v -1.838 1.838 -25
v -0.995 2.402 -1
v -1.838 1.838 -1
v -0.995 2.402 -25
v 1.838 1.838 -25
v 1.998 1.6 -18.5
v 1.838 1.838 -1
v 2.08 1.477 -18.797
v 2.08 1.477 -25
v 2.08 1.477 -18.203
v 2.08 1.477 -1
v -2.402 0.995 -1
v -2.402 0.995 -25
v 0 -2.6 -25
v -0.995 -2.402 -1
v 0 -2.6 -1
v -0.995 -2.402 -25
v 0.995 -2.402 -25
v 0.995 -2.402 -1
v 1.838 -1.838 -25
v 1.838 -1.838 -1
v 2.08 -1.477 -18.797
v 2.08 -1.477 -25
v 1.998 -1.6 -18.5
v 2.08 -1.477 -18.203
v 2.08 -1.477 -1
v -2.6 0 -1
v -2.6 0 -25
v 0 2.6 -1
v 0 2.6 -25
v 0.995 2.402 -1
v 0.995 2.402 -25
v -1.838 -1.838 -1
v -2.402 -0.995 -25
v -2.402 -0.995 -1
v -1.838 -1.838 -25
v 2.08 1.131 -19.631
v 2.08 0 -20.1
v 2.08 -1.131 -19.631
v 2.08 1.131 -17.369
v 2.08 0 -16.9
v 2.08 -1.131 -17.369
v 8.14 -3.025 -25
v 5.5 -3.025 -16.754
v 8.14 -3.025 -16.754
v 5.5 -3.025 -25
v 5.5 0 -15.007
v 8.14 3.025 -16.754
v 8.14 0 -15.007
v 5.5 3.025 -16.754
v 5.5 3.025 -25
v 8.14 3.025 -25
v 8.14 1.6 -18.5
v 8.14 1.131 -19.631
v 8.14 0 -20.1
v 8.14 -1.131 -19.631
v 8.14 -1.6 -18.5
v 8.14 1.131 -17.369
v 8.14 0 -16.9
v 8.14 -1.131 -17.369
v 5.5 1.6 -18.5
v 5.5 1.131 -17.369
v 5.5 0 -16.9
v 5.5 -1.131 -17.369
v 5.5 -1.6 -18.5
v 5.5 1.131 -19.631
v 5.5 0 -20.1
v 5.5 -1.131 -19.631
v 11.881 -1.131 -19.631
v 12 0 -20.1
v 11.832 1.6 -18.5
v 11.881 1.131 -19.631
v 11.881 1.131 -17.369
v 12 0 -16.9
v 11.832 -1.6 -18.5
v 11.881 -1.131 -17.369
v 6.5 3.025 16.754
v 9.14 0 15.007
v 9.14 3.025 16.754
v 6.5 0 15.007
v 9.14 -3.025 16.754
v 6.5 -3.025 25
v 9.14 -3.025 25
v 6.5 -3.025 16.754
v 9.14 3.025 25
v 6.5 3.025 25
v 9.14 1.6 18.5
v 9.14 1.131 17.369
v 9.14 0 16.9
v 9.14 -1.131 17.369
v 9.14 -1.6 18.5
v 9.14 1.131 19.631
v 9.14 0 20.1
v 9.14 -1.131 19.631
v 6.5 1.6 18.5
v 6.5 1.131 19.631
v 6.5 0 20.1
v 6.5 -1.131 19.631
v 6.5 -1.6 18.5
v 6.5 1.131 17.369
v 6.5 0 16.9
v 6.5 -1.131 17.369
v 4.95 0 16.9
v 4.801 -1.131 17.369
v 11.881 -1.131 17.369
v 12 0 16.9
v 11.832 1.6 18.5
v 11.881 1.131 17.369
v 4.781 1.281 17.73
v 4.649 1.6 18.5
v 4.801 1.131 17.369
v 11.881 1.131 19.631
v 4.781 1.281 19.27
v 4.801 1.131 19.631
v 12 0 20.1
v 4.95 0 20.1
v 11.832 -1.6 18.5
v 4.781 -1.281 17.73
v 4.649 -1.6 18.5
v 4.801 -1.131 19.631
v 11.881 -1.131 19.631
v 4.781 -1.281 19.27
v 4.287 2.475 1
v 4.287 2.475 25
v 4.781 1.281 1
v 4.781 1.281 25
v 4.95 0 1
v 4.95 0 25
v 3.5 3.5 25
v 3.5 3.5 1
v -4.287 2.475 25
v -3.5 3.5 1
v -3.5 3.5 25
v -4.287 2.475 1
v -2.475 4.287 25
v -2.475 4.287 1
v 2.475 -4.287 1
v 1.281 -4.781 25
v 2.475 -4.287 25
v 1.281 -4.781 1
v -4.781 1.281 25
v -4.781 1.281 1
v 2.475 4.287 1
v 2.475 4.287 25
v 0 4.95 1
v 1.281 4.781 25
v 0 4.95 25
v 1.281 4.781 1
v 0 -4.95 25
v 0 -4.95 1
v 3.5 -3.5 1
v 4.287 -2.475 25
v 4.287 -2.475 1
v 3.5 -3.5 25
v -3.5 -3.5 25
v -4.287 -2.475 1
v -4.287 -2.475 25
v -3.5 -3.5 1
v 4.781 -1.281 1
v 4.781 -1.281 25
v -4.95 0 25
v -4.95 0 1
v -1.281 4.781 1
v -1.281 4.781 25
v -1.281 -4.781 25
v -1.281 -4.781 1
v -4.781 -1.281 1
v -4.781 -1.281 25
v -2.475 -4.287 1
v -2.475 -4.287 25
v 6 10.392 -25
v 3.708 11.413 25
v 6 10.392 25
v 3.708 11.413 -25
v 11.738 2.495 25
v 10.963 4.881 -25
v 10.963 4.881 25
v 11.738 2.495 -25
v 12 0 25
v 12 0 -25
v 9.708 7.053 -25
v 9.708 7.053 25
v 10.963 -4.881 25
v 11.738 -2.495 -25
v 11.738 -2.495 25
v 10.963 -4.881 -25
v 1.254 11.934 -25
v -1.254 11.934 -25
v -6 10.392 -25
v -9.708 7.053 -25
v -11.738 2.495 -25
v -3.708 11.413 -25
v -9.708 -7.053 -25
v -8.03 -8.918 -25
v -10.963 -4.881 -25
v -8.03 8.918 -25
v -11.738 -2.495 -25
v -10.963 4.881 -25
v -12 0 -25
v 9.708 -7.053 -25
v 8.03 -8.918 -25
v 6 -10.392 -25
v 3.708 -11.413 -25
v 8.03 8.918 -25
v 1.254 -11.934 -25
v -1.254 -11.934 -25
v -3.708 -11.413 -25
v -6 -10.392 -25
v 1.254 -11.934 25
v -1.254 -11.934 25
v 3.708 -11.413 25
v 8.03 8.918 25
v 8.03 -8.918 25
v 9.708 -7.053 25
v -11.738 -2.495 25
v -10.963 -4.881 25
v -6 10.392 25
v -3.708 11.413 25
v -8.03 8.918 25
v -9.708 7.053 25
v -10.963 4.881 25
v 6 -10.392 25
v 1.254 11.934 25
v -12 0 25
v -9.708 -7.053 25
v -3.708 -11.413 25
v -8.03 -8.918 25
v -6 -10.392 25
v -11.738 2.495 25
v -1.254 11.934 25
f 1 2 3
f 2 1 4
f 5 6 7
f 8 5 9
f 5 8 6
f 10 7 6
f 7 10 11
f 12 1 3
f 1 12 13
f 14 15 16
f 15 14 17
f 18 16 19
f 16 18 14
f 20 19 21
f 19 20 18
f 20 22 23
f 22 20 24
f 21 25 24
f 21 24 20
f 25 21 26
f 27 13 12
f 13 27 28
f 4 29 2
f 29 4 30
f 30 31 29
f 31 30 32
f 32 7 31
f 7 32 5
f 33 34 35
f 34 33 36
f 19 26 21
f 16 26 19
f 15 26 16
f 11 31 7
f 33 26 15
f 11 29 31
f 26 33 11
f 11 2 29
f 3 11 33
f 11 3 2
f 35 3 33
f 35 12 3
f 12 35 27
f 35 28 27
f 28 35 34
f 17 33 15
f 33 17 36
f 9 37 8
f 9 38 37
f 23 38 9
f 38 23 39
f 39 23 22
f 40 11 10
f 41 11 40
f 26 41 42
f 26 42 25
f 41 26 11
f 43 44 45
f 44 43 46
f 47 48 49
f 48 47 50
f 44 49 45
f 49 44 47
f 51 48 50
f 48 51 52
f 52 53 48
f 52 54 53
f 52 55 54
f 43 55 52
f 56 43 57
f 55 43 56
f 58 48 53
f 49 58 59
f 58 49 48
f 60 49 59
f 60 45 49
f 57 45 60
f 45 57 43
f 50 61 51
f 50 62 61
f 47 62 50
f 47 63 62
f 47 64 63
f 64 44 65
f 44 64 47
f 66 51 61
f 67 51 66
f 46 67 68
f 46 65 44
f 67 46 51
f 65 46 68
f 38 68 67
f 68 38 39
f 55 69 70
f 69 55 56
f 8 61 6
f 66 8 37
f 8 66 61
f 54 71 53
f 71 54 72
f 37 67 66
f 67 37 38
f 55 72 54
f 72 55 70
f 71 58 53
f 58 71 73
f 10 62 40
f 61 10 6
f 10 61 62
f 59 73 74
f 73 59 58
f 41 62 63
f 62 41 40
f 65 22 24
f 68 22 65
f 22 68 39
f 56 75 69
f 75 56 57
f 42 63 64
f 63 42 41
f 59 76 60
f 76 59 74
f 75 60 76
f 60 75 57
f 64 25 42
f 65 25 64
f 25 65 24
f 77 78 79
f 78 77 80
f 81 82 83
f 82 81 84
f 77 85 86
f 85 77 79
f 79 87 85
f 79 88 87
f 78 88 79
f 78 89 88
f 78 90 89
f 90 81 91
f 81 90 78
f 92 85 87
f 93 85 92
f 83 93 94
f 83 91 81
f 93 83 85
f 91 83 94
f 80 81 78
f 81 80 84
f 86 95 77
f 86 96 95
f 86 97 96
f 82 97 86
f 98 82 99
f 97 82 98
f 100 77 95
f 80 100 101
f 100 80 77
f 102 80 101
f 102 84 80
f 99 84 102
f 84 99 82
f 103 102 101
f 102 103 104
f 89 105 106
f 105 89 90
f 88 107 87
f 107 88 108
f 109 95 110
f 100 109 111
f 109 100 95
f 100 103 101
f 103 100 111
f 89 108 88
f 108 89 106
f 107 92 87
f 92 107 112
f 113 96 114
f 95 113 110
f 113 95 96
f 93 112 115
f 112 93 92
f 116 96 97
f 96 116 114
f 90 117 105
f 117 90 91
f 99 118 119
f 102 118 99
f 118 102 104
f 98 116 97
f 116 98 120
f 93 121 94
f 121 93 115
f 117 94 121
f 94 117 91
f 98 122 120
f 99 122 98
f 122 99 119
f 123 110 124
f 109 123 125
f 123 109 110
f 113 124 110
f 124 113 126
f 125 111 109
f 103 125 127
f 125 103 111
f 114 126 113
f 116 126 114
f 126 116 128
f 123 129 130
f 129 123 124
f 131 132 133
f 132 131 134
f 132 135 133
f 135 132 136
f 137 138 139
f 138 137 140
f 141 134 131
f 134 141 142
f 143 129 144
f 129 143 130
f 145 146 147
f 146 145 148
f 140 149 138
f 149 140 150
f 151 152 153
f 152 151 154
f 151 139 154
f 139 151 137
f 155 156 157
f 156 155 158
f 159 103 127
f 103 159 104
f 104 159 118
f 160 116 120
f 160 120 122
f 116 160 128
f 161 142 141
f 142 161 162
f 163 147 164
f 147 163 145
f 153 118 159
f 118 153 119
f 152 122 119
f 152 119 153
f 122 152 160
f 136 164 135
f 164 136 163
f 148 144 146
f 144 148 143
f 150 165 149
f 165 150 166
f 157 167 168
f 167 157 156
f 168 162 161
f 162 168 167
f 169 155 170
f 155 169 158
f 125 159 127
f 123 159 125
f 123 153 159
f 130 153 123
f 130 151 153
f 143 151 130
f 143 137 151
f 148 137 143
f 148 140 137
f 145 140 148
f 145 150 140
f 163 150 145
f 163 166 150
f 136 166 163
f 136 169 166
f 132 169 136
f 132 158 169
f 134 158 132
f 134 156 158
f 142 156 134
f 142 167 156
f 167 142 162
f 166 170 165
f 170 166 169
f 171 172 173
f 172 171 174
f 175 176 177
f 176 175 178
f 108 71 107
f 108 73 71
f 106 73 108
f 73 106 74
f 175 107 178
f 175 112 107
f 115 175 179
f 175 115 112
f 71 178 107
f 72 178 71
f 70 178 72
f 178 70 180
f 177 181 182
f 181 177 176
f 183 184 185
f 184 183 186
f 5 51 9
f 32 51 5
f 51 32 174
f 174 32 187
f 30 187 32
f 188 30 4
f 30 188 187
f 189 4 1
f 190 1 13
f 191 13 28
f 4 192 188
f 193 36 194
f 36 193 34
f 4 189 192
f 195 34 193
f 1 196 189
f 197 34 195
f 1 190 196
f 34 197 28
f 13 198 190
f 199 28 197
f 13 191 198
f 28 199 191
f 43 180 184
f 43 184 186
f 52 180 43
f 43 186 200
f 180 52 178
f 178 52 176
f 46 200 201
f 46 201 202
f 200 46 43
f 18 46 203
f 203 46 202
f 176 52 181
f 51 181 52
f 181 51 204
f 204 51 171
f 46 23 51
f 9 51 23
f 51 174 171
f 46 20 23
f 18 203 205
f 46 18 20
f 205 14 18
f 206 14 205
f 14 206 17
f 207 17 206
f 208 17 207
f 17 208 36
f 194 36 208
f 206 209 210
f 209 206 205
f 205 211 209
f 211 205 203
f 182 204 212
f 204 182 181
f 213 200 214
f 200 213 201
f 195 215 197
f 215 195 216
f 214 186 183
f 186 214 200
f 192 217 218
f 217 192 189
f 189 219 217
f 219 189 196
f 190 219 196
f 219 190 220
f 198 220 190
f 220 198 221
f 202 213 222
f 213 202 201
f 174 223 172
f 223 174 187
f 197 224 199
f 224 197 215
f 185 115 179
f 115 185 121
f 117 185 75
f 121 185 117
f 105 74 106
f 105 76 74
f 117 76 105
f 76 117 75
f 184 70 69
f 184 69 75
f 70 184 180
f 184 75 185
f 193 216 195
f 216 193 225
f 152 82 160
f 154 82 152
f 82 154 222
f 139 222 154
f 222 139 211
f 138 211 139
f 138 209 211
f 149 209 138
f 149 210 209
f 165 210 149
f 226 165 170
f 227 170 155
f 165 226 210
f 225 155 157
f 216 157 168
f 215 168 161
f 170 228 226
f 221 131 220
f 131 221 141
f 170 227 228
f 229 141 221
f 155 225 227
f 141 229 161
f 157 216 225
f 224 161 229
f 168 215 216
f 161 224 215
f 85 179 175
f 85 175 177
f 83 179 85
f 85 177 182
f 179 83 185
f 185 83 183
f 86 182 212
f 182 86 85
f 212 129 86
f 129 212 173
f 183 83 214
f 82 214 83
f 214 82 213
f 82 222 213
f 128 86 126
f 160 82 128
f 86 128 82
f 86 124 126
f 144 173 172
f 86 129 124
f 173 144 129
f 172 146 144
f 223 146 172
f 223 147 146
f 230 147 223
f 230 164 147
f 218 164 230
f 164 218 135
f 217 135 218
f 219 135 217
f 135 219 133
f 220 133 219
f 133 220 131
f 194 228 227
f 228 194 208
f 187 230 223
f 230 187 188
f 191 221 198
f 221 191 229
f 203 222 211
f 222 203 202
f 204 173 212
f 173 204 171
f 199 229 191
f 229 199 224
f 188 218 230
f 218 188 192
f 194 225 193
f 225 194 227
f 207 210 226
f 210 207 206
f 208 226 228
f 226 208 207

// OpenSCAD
// file: joiners.scad
include <config.scad>
use <GDMUtils.scad>


module joiner(h=40, w=10, l=10, a=30, screwsize=3, guides=true)
{
	dmnd_height = h/2;
	dmnd_width = dmnd_height*tan(a);
	guide_size = w/3;

	render(convexity=4) union() {
		difference() {
			union() {
				// Make base.
				difference() {
					union() {
						translate([0,-l/2,0]) cube(size=[w, l, h], center=true);
						translate([0,0,-h/4])
							scale([w, dmnd_width/2, dmnd_height/2])
								xrot(45) cube(size=[1,sqrt(2),sqrt(2)], center=true);
					}
					translate([0,0,h/4])
						scale([w*1.1, dmnd_width/2, dmnd_height/2])
							xrot(45) cube(size=[1,sqrt(2),sqrt(2)], center=true);
				}

				// Make tab
				translate([0,0,dmnd_height/2]) {
					translate([0, -dmnd_width/4, 0])
						cube(size=[w/3-joiner_slop, dmnd_width/2, dmnd_height], center=true);
					scale([w/3-joiner_slop, dmnd_width/2, dmnd_height/2]) xrot(45)
						cube(size=[1,sqrt(2),sqrt(2)], center=true);
				}

				// Guide ridges.
				if (guides == true) {
					translate([0,0,dmnd_height/2]) {
						grid_of(xa=[-(w/6-joiner_slop/2), (w/6-joiner_slop/2)]) {
							// Guide ridge.
							scale([0.75, 1, 2]) yrot(45)
								cube(size=[guide_size/sqrt(2), dmnd_width, guide_size/sqrt(2)], center=true);

							// Snap ridge.
							scale([0.25, 0.5, 1]) zrot(45)
								cube(size=[guide_size/sqrt(2), guide_size/sqrt(2), dmnd_width], center=true);
						}
					}
				}
			}

			// Make slot
			translate([0, 0, -dmnd_height/2]) {
				translate([0, dmnd_width/4, 0])
					cube(size=[w/3, dmnd_width/2, dmnd_height], center=true);
				scale([w/3, dmnd_width/2, dmnd_height/2]) xrot(45)
					cube(size=[1,sqrt(2),sqrt(2)], center=true);
			}

			// Blunt point of tab.
			translate([0,(2+dmnd_width/2-guide_size*tan(a)),0])
				cube(size=[w*1.1,4,h], center=true);

			// Make screwholes, if needed.
			if (screwsize != undef) {
				xrot_copies([0, 180])
					translate([0, 0, dmnd_height/2])
						yrot(90) cylinder(r=screwsize*1.1/2, h=w+1, center=true, $fn=12);
			}

			// Guide slots.
			if (guides == true) {
				translate([0,0,-dmnd_height/2]) {
					grid_of(xa=[-(w/6),(w/6)]) {
						// Guide slot
						scale([0.75, 1, 2]) yrot(45)
							cube(size=[guide_size/sqrt(2), dmnd_width*1.1, guide_size/sqrt(2)], center=true);

						// Snap hole
						scale([0.25, 0.5, 1]) zrot(45)
							cube(size=[guide_size/sqrt(2), guide_size/sqrt(2), dmnd_width], center=true);
					}
				}
			}
		}

		// Blunt point of slot.
		translate([0,-(2+dmnd_width/2-guide_size*tan(a)),0])
			cube(size=[w,4,h], center=true);
	}
}
joiner(screwsize=3);



// vim: noexpandtab tabstop=4 shiftwidth=4 softtabstop=4 nowrap
// file: config.scad
snappy_version = 0.90;


platform_length = 110; // mm.  Must be a multiple of rack_tooth_size.
platform_width  = 150; // mm
platform_height =  40; // mm
platform_thick  =   7; // mm
rack_tooth_size =   5; // mm per tooth.

rail_length  = 150;    // mm
rail_height  =  50;    // mm
rail_thick   =   7;    // mm

motor_rail_length = 100; // mm

roller_thick =  12;    // mm
roller_diam  =  30;    // mm
roller_axle  =  15;    // mm
roller_base  =  12;    // mm
roller_angle =  30;    // degrees

joiner_angle =  30;    // degrees
joiner_width =  10;    // mm
joiner_slop  =   0.5;  // mm

// Currently configured for 3/8" ACME threaded rod and matching 11/16" nut
lifter_rod_diam   =   9.5; // mm
lifter_rod_length = 300.0; // mm
lifter_nut_size   =  17.4; // mm
lifter_nut_thick  =   9.3; // mm
lifter_thread_size =  3.175; // mm lift per revolution




// Commonly used derived values.  Don't change these.
rail_spacing = platform_width - joiner_width*4 - 10;
roller_spacing = rail_spacing-roller_diam+0.5;
rail_width = rail_spacing + joiner_width*2;



// vim: noexpandtab tabstop=4 shiftwidth=4 softtabstop=4 nowrap
// main file
include <config.scad>
use <GDMUtils.scad>
use <joiners.scad>


module lifter_rod_coupler()
{
	h = 50;
	shaft = 5.2;
	setscrew = 3.2;

	color("Lavender") difference() {
		// Coupler cylinder.
		cylinder(h=h, r=12, center=true);

		translate([0, 0, -(h/4+1)]) {
			difference() {
				// Stepper shaft hole
				cylinder(h=h/2, r=shaft/2, center=true, $fn=16);

				// Shaft flat side.
				translate([1.4*shaft, 0, 0])
					cube(size=[shaft*2, shaft*2, h/2+1], center=true);
			}

			//Stepper set screw
			translate([5/2+2, 0, -(h/4-7.5)]) {
				yrot(90) {
					// Nut Slot
					translate([0, 0, 1]) scale([1.1, 1.1, 1.1]) hull() {
						metric_nut(size=3, hole=false);
						translate([10, 0, 0])
							metric_nut(size=3, hole=false);
					}

					// Set screw hole.
					translate([0, 0, 2.5])
						cylinder(r=setscrew/2, h=12, center=true, $fn=8);
				}
			}
		}

		translate([0, 0, (h/4+1)]) {
			// Lifter rod hole.
			cylinder(h=h/2, r=lifter_rod_diam/2+0.2, center=true, $fn=24);

			//Lifter rod set screw
			translate([5/2+3, 0, (h/4-7.5)]) {
				yrot(90) {
					// Nut Slot
					translate([0, 0, 1]) scale([1.1, 1.1, 1.1]) hull() {
						metric_nut(size=3, hole=false);
						translate([-10, 0, 0])
							metric_nut(size=3, hole=false);
					}

					// Set screw hole.
					translate([0, 0, 2.5])
						cylinder(r=setscrew/2, h=10, center=true, $fn=8);
				}
			}
		}
	}
}
//!lifter_rod_coupler();



module lifter_rod_couple_part() { // make me
	lifter_rod_coupler();
}



lifter_rod_couple_part();



// vim: noexpandtab tabstop=4 shiftwidth=4 softtabstop=4 nowrap
